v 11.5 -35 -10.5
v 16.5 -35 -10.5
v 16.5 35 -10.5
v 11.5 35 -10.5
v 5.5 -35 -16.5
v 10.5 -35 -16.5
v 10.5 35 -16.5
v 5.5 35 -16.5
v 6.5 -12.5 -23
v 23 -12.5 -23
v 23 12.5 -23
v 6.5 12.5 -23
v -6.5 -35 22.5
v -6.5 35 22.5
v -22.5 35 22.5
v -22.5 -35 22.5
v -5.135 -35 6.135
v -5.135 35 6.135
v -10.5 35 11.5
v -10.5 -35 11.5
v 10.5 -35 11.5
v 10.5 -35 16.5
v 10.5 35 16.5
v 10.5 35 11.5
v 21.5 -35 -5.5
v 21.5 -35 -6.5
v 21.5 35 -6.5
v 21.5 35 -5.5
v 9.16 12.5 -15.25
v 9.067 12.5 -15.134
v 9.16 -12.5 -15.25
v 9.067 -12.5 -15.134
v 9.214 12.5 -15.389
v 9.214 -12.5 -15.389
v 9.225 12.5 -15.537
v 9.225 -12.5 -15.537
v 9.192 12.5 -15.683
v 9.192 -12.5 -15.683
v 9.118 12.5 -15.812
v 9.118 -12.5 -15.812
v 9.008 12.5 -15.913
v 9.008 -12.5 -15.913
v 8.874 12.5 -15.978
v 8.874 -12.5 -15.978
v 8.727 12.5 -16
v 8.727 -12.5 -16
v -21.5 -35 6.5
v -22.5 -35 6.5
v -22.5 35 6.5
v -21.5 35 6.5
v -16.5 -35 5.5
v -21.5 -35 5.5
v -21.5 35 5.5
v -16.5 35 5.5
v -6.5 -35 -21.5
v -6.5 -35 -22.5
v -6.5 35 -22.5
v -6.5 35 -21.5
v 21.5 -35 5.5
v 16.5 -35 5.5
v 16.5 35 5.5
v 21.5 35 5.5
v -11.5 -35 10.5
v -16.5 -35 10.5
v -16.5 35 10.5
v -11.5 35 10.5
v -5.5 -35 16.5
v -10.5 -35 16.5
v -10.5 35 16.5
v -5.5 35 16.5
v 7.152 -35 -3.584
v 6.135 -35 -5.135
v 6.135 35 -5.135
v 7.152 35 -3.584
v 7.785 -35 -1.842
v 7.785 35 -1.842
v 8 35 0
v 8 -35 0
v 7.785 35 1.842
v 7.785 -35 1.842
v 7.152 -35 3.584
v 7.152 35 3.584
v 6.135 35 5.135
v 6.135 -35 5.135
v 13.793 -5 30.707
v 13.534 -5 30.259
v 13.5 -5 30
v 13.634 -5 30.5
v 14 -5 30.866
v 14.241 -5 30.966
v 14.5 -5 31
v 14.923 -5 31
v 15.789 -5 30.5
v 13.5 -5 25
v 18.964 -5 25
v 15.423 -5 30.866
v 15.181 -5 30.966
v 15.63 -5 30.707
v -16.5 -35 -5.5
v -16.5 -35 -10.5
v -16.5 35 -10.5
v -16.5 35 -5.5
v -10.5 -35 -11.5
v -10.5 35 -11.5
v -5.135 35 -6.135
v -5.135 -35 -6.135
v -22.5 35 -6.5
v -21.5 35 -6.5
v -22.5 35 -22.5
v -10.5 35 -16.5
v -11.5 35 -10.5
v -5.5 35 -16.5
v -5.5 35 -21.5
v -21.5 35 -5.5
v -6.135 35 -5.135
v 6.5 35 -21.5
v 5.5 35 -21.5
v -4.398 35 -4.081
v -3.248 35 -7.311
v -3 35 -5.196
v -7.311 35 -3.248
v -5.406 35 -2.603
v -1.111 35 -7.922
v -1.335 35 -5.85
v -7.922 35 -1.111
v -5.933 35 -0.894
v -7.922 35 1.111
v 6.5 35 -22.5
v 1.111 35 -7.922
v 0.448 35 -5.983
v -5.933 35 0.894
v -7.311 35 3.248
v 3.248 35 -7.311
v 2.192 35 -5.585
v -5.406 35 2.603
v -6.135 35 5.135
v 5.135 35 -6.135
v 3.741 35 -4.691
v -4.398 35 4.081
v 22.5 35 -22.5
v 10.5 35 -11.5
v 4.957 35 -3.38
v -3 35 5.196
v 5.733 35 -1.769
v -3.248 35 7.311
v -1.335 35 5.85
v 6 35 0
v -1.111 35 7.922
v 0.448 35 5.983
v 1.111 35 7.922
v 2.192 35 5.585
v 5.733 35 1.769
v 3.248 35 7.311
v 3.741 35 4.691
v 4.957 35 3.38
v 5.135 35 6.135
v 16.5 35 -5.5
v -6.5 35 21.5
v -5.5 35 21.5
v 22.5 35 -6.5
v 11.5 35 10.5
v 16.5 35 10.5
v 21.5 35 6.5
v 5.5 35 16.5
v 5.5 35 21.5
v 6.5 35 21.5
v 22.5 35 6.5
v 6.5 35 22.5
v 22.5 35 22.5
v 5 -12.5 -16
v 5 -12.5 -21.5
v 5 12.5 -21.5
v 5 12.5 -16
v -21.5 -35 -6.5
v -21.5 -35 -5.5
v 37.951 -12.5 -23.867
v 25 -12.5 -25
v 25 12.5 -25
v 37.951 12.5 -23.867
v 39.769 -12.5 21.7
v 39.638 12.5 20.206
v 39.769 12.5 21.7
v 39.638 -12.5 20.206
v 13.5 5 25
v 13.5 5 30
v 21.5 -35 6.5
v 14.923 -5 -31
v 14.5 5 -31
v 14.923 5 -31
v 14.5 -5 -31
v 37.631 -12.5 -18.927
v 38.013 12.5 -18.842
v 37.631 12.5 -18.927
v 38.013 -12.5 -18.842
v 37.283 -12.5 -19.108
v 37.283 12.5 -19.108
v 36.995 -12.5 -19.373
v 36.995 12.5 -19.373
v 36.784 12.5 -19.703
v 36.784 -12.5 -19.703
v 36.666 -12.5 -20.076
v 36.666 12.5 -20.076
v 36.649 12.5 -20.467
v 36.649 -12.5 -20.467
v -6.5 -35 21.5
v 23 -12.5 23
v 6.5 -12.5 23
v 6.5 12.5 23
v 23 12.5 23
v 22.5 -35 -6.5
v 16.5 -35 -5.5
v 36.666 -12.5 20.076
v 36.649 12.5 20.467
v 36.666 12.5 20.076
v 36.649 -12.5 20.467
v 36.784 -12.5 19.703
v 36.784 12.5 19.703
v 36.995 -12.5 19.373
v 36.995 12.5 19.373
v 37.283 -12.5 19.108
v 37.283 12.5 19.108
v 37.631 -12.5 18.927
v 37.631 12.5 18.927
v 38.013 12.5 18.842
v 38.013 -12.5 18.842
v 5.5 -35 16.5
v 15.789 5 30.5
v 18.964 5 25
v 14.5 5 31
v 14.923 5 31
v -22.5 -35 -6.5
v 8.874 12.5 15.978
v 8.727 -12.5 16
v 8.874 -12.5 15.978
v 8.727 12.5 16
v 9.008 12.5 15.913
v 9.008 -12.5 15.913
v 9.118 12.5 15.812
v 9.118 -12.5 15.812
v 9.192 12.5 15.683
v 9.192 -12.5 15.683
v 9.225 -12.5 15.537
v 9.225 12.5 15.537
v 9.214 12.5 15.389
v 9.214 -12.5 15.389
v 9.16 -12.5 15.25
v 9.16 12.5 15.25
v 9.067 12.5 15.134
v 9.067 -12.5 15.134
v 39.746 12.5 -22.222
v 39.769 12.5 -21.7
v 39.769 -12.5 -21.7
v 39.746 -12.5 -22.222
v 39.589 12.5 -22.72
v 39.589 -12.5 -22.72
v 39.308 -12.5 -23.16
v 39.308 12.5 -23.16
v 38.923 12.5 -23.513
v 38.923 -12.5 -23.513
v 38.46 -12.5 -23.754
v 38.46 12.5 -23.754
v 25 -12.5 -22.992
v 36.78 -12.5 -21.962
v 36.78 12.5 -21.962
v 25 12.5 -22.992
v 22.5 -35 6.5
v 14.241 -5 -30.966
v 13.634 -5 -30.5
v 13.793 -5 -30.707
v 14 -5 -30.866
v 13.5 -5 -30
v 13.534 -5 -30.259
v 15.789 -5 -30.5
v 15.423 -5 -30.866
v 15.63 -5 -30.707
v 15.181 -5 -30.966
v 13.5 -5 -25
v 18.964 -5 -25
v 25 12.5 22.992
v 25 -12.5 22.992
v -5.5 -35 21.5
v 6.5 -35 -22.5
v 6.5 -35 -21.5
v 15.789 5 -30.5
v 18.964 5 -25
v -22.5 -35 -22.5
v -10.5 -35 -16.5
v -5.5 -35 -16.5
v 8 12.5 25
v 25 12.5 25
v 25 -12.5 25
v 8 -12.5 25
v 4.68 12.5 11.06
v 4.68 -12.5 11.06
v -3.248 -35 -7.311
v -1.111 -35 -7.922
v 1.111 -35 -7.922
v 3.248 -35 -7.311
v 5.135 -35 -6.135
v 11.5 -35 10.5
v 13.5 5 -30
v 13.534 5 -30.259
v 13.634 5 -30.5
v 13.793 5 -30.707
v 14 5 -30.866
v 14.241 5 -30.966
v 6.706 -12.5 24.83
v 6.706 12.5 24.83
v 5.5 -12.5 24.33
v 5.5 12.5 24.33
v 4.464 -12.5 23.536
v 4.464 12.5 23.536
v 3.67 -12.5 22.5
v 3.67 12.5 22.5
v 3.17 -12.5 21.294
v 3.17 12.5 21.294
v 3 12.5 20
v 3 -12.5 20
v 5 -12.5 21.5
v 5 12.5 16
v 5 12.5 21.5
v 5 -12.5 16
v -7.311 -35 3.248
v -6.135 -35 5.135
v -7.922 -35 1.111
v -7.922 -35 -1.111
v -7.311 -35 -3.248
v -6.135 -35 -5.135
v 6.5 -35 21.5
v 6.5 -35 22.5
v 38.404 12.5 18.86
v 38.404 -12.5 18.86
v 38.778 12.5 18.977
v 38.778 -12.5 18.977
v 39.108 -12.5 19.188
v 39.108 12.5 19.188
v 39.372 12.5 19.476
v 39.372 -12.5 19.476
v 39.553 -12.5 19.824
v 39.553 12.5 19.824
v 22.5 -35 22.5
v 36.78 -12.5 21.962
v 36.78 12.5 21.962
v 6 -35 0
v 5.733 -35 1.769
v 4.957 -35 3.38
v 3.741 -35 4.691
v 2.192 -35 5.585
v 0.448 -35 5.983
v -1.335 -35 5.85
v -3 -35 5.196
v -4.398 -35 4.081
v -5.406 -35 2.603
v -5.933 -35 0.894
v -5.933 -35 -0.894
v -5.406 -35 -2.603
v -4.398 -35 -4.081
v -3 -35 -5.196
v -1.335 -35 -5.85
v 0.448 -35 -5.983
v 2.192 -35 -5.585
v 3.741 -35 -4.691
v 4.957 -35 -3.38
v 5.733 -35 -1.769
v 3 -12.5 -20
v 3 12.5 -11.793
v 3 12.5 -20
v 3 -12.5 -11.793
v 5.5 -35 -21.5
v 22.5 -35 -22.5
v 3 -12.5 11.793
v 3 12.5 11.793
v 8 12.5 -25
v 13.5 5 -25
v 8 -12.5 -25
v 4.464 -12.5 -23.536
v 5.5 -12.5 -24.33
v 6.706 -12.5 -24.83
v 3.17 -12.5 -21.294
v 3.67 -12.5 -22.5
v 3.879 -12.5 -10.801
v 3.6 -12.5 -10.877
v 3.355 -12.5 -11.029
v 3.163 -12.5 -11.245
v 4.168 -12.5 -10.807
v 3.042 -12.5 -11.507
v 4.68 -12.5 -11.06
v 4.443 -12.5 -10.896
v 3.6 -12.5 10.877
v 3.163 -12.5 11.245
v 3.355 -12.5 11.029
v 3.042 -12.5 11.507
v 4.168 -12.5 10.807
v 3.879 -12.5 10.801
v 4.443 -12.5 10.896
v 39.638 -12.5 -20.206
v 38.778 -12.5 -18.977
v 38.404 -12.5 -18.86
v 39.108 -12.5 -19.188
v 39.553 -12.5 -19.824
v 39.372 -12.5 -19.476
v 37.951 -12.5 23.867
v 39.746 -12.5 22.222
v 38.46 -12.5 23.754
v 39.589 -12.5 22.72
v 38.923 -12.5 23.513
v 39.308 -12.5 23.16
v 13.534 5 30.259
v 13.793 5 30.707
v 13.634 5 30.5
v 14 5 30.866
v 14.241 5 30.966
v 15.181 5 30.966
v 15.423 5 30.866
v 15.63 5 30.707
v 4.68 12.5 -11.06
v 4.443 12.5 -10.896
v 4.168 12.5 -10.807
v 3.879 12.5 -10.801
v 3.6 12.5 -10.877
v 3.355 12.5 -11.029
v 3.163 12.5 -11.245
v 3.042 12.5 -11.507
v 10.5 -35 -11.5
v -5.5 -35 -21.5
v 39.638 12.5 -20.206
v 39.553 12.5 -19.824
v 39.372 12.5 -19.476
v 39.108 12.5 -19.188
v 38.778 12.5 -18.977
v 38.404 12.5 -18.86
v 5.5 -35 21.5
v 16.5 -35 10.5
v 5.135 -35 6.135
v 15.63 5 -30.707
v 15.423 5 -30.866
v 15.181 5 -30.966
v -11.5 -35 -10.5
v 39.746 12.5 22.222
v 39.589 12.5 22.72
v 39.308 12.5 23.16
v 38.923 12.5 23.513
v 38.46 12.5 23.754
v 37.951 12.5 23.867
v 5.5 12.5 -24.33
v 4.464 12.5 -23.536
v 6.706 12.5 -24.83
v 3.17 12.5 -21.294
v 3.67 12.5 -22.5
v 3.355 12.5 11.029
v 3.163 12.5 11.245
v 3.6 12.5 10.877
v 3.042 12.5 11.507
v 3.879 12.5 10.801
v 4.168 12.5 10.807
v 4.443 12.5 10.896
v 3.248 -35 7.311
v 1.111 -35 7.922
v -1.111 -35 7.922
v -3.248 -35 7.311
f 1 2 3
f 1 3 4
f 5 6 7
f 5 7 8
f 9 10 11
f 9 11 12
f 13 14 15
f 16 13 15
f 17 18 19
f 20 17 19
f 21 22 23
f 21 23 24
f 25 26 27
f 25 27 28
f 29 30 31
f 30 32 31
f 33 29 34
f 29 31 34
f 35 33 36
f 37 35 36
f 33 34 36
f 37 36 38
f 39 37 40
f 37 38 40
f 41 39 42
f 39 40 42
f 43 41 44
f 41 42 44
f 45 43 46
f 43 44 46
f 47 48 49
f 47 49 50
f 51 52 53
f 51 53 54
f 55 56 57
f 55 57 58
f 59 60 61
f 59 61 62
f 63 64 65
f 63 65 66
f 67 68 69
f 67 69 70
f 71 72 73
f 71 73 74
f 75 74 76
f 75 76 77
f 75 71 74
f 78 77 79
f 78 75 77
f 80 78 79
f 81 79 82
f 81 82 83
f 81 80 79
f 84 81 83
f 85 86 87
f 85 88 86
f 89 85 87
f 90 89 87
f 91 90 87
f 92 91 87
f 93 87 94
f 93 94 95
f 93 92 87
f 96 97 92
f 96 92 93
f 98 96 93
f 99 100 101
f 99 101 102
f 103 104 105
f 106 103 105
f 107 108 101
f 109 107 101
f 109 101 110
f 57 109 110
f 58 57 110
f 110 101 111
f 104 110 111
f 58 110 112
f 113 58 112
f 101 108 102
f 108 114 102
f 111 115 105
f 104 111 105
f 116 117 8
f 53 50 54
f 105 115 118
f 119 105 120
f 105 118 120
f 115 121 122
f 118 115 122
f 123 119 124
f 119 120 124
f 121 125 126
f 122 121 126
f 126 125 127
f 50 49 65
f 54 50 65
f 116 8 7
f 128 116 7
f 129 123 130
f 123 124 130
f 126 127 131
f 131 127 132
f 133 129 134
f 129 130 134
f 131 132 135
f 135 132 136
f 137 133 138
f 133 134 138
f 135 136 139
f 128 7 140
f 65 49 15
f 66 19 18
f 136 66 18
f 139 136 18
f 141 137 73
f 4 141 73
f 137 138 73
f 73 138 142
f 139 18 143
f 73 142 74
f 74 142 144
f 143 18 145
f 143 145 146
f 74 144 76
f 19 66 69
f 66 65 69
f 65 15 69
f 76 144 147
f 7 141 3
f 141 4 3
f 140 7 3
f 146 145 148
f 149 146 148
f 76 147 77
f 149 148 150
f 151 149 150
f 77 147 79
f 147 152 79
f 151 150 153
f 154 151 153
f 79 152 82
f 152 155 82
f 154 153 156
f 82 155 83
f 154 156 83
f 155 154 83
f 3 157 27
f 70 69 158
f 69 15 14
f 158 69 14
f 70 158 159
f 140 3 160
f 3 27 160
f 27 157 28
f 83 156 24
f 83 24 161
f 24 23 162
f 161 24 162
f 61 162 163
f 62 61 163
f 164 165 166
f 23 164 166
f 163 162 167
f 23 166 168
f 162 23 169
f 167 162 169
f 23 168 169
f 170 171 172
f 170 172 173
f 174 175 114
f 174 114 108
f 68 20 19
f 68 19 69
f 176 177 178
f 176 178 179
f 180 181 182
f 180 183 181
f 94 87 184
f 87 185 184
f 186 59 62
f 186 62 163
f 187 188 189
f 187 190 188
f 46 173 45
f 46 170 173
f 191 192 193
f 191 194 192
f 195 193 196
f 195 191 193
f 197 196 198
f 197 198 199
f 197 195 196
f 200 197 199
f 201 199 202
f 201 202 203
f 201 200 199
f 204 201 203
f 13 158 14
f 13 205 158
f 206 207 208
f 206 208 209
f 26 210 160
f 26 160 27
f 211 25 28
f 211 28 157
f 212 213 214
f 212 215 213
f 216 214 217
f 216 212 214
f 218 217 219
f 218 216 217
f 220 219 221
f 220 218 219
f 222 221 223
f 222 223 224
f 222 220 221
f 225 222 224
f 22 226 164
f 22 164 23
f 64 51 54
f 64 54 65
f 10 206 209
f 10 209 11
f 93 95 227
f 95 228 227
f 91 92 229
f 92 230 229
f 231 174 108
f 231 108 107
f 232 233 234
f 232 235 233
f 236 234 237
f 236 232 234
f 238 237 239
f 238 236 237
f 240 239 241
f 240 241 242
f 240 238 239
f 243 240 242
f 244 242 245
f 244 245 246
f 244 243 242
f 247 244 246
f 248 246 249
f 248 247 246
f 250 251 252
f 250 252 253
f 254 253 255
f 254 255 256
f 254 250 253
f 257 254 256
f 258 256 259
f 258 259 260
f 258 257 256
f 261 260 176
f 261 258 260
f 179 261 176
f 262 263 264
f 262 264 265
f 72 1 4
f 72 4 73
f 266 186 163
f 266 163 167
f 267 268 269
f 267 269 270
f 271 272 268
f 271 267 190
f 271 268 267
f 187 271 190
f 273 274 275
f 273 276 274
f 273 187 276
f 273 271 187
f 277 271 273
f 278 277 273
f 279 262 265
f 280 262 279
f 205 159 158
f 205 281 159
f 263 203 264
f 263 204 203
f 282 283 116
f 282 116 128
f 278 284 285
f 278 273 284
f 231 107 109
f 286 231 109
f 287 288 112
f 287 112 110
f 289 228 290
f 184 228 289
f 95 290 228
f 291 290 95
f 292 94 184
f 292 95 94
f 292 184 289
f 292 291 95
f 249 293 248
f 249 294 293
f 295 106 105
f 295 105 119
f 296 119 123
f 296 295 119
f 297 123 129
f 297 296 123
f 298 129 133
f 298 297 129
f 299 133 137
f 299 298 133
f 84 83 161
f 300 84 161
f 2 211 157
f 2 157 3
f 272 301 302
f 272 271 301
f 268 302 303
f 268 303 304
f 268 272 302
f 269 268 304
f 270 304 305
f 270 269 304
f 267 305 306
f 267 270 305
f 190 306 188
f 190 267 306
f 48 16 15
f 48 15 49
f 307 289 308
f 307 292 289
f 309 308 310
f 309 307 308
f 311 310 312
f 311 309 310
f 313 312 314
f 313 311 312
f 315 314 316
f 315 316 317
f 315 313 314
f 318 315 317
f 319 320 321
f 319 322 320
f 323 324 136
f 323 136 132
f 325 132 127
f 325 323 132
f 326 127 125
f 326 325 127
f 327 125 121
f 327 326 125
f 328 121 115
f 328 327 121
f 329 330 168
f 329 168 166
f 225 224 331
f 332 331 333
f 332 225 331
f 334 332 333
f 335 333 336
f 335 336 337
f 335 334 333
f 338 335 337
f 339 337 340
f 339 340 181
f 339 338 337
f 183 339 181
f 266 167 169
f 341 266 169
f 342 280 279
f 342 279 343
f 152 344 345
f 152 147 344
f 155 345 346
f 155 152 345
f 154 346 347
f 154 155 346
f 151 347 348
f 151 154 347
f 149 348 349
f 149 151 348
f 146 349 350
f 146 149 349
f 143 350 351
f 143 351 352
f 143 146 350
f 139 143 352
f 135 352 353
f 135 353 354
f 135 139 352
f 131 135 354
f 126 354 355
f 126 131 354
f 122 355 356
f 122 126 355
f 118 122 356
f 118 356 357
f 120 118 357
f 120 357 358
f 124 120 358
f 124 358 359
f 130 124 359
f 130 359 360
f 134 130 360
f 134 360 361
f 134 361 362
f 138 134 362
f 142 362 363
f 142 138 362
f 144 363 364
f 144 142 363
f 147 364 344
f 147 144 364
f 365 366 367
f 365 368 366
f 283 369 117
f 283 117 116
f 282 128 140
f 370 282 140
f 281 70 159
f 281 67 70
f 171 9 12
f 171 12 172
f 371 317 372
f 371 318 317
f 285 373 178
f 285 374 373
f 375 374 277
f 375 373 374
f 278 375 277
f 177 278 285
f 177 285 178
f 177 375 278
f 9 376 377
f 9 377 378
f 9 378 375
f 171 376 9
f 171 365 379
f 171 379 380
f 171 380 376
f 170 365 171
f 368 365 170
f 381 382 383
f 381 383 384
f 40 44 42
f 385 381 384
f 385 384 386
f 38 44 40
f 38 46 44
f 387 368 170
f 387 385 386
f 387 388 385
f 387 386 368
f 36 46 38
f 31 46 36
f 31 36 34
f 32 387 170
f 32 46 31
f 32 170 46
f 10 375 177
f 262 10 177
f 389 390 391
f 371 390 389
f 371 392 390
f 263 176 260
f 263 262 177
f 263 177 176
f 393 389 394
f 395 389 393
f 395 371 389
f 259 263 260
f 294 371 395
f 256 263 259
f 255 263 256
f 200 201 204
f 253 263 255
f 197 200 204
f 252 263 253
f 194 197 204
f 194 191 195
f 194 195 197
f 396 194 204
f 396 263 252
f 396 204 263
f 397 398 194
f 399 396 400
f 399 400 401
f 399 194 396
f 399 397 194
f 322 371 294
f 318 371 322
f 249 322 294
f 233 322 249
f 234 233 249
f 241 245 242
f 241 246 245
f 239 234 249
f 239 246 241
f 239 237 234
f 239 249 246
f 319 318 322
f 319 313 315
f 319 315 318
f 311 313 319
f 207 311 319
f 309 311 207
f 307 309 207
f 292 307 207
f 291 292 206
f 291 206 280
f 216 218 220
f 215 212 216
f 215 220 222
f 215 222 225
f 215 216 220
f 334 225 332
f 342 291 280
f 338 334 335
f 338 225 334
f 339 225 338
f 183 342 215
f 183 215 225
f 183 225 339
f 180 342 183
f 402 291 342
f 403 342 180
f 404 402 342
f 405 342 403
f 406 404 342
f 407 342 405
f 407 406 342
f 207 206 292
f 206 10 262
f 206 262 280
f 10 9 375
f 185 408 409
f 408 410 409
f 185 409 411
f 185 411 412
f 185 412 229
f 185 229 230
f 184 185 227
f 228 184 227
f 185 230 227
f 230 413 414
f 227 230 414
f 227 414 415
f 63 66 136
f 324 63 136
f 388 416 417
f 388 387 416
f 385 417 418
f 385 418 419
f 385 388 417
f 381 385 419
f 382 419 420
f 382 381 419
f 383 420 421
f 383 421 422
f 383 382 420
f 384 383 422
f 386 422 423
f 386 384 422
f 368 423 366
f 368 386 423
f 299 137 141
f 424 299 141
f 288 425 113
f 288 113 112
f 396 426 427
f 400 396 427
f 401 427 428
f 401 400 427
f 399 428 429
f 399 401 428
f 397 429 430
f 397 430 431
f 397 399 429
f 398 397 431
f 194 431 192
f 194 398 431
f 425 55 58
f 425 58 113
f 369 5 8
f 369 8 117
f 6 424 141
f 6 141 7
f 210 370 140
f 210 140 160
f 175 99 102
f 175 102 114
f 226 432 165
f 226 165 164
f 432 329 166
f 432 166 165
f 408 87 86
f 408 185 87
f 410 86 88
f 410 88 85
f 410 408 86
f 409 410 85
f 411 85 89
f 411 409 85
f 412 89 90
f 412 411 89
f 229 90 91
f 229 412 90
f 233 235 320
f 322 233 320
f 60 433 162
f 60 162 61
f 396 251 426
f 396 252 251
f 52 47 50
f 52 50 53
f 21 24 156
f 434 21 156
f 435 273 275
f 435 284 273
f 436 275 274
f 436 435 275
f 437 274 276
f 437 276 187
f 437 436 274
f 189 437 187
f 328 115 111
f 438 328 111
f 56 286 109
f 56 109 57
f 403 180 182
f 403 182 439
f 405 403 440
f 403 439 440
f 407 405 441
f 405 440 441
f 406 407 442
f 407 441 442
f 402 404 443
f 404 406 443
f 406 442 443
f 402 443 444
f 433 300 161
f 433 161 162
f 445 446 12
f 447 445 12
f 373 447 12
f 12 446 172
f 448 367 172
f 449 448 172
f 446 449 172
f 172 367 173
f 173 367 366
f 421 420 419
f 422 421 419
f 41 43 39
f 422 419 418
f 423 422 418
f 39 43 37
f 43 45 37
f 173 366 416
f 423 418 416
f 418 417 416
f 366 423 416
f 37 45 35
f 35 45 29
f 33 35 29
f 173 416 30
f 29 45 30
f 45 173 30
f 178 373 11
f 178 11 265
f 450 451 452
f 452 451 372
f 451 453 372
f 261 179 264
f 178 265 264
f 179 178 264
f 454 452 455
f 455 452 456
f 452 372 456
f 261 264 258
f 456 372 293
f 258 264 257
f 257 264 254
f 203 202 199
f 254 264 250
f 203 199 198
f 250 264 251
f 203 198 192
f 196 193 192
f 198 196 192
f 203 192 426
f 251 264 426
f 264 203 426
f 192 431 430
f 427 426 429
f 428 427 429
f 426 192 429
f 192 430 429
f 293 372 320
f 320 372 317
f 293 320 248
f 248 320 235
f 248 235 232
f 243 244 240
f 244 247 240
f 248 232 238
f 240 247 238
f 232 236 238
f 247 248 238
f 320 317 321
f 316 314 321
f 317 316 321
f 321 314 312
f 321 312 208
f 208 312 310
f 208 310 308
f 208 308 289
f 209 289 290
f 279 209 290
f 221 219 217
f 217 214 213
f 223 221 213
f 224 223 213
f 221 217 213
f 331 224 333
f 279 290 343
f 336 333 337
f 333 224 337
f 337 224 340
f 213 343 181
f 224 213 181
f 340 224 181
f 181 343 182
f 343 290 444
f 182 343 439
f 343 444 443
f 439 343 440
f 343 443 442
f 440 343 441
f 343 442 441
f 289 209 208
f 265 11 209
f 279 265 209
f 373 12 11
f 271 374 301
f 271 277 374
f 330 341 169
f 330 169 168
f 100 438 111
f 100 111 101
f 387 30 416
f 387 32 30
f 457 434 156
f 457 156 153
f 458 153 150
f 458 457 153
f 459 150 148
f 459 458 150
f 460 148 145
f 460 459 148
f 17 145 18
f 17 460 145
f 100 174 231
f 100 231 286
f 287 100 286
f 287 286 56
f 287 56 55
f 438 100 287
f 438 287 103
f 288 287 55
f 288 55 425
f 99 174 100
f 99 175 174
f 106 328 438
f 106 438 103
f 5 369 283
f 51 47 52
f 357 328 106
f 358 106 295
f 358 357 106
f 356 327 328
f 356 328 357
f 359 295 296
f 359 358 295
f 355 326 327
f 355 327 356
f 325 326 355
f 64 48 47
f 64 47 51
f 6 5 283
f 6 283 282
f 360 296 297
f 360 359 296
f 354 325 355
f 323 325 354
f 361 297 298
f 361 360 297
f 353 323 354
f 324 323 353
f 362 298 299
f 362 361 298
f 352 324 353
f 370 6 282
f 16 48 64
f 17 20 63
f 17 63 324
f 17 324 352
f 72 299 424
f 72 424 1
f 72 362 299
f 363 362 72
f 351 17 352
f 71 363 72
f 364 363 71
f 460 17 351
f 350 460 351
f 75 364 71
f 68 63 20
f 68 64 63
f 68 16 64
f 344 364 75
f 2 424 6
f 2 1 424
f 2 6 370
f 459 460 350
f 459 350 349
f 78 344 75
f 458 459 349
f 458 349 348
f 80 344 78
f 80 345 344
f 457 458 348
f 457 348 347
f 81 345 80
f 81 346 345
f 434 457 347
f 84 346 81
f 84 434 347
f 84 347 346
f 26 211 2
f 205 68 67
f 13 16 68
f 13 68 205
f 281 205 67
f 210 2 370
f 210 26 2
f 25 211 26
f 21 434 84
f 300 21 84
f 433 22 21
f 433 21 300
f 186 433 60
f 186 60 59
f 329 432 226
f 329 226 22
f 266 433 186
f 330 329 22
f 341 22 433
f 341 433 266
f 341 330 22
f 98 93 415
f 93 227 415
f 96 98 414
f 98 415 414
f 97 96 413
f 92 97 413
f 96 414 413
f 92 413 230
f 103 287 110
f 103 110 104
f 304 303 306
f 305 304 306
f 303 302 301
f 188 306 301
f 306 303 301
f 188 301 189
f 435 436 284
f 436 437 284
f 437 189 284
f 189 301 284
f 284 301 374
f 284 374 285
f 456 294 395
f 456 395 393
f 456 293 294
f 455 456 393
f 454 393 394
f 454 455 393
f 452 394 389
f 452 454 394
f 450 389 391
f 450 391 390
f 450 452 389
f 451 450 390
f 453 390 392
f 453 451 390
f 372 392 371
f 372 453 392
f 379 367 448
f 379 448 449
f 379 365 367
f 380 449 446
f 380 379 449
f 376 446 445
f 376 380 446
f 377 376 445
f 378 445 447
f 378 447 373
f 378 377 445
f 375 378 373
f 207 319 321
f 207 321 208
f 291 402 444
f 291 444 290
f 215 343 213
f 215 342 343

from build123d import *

# Parameters (mm, degrees)
F0_R         = 6
F1_DEPTH     = 35
F3_DEPTH     = 12.5
F4_DEPTH     = 5
F5_R         = 5
F6_R         = 0.5
F7_R         = 1
F8_R         = 1
F9_R         = 1.49999
F10_T1_DEPTH = 35


# Not quite as in the source:
# - a fillet or chamfer that OpenCascade refuses, or shapes differently, is made with other operations: its cross-section is extruded or revolved along the edge and cut away or added
# - a fillet or chamfer is up to 0.001 mm smaller than in the source, because OpenCascade refuses the exact size


with BuildPart() as f1:
    # F0 (on Front) → F1 (new body, symmetric)
    with BuildSketch(Plane.XZ):
        with BuildLine():
            Line((-6.5, 21.5), (-6.5, 22.5))
            Line((-6.5, 22.5), (-22.5, 22.5))
            Line((-22.5, 22.5), (-22.5, 6.5))
            Line((-22.5, 6.5), (-21.5, 6.5))
            Line((-21.5, 6.5), (-21.5, 5.5))
            Line((-21.5, 5.5), (-16.5, 5.5))
            Line((-16.5, 5.5), (-16.5, 10.5))
            Line((-16.5, 10.5), (-11.5, 10.5))
            Line((-11.5, 10.5), (-6.1347138348, 5.1347138348))
            ThreePointArc((-6.1347138348, 5.1347138348), (-5.6568542495, 5.6568542495), (-5.1347138348, 6.1347138348))
            Line((-5.1347138348, 6.1347138348), (-10.5, 11.5))
            Line((-10.5, 11.5), (-10.5, 16.5))
            Line((-10.5, 16.5), (-5.5, 16.5))
            Line((-5.5, 16.5), (-5.5, 21.5))
            Line((-5.5, 21.5), (-6.5, 21.5))
        make_face()
        with BuildLine():
            ThreePointArc((5.1347138348, 6.1347138348), (0, 8), (-5.1347138348, 6.1347138348))
            ThreePointArc((-5.1347138348, 6.1347138348), (-5.6568542495, 5.6568542495), (-6.1347138348, 5.1347138348))
            ThreePointArc((-6.1347138348, 5.1347138348), (-8, 0), (-6.1347138348, -5.1347138348))
            ThreePointArc((-6.1347138348, -5.1347138348), (-5.6568542495, -5.6568542495), (-5.1347138348, -6.1347138348))
            ThreePointArc((-5.1347138348, -6.1347138348), (0, -8), (5.1347138348, -6.1347138348))
            ThreePointArc((5.1347138348, -6.1347138348), (5.6568542495, -5.6568542495), (6.1347138348, -5.1347138348))
            ThreePointArc((6.1347138348, -5.1347138348), (7.5192323637, -2.7315095938), (8, 0))
            ThreePointArc((8, 0), (7.5192323637, 2.7315095938), (6.1347138348, 5.1347138348))
            ThreePointArc((6.1347138348, 5.1347138348), (5.6568542495, 5.6568542495), (5.1347138348, 6.1347138348))
        make_face()
        Circle(F0_R, mode=Mode.SUBTRACT)
        with BuildLine():
            Line((10.5, 11.5), (5.1347138348, 6.1347138348))
            ThreePointArc((5.1347138348, 6.1347138348), (5.6568542495, 5.6568542495), (6.1347138348, 5.1347138348))
            Line((6.1347138348, 5.1347138348), (11.5, 10.5))
            Line((11.5, 10.5), (16.5, 10.5))
            Line((16.5, 10.5), (16.5, 5.5))
            Line((16.5, 5.5), (21.5, 5.5))
            Line((21.5, 5.5), (21.5, 6.5))
            Line((21.5, 6.5), (22.5, 6.5))
            Line((22.5, 6.5), (22.5, 22.5))
            Line((22.5, 22.5), (6.5, 22.5))
            Line((6.5, 22.5), (6.5, 21.5))
            Line((6.5, 21.5), (5.5, 21.5))
            Line((5.5, 21.5), (5.5, 16.5))
            Line((5.5, 16.5), (10.5, 16.5))
            Line((10.5, 16.5), (10.5, 11.5))
        make_face()
        with BuildLine():
            ThreePointArc((-5.1347138348, -6.1347138348), (-5.6568542495, -5.6568542495), (-6.1347138348, -5.1347138348))
            Line((-6.1347138348, -5.1347138348), (-11.5, -10.5))
            Line((-11.5, -10.5), (-16.5, -10.5))
            Line((-16.5, -10.5), (-16.5, -5.5))
            Line((-16.5, -5.5), (-21.5, -5.5))
            Line((-21.5, -5.5), (-21.5, -6.5))
            Line((-21.5, -6.5), (-22.5, -6.5))
            Line((-22.5, -6.5), (-22.5, -22.5))
            Line((-22.5, -22.5), (-6.5, -22.5))
            Line((-6.5, -22.5), (-6.5, -21.5))
            Line((-6.5, -21.5), (-5.5, -21.5))
            Line((-5.5, -21.5), (-5.5, -16.5))
            Line((-5.5, -16.5), (-10.5, -16.5))
            Line((-10.5, -16.5), (-10.5, -11.5))
            Line((-10.5, -11.5), (-5.1347138348, -6.1347138348))
        make_face()
        with BuildLine():
            Line((11.5, -10.5), (6.1347138348, -5.1347138348))
            ThreePointArc((6.1347138348, -5.1347138348), (5.6568542495, -5.6568542495), (5.1347138348, -6.1347138348))
            Line((5.1347138348, -6.1347138348), (10.5, -11.5))
            Line((10.5, -11.5), (10.5, -16.5))
            Line((10.5, -16.5), (5.5, -16.5))
            Line((5.5, -16.5), (5.5, -21.5))
            Line((5.5, -21.5), (6.5, -21.5))
            Line((6.5, -21.5), (6.5, -22.5))
            Line((6.5, -22.5), (22.5, -22.5))
            Line((22.5, -22.5), (22.5, -6.5))
            Line((22.5, -6.5), (21.5, -6.5))
            Line((21.5, -6.5), (21.5, -5.5))
            Line((21.5, -5.5), (16.5, -5.5))
            Line((16.5, -5.5), (16.5, -10.5))
            Line((16.5, -10.5), (11.5, -10.5))
        make_face()
    extrude(amount=F1_DEPTH, both=True)


with BuildPart() as f3:
    # F2 (on Front) → F3 (new body, symmetric)
    with BuildSketch(Plane.XZ):
        Polygon((5, 16), (5, 21.5), (6.5, 23), (23, 23), (23, 0), (23, -23), (6.5, -23), (5, -21.5), (5, -16), (10, -16), (3, -9.5), (3, -21.5), (3, -25), (6.5, -25), (13.5, -25), (18.9641016151, -25), (22.5, -25), (25, -25), (25, -22.9923603249), (25, -22.5), (25, 0), (25, 22.5), (25, 22.9923603249), (25, 25), (22.5, 25), (18.9641016151, 25), (15.5, 25), (14.5, 25), (13.5, 25), (6.5, 25), (3, 25), (3, 21.5), (3, 9.5), (10, 16), align=None)
        Polygon((39.9429204714, 23.6926638588), (25, 25), (25, 22.9923603249), (36.7800248916, 21.9617416908), (39.7686089859, 21.7002744626), align=None)
        Polygon((39.7686089859, 21.7002744626), (36.7800248916, 21.9617416908), (36.5185576634, 18.9731575966), (39.5071417576, 18.7116903683), align=None)
        Polygon((25, -22.9923603249), (25, -25), (39.9429204714, -23.6926638588), (39.7686089859, -21.7002744626), (36.7800248916, -21.9617416908), align=None)
        Polygon((36.5185576634, -18.9731575966), (36.7800248916, -21.9617416908), (39.7686089859, -21.7002744626), (39.5071417576, -18.7116903683), align=None)
    extrude(amount=F3_DEPTH, both=True)

    # F2 (on Front) → F4 (join, symmetric)
    with BuildSketch(Plane.XZ):
        Polygon((13.5, 31), (13.5, 25), (14.5, 25), (15.5, 25), (18.9641016151, 25), (15.5, 31), align=None)
        Polygon((18.9641016151, -25), (13.5, -25), (13.5, -31), (15.5, -31), align=None)
    extrude(amount=F4_DEPTH, both=True)

    # F5
    f5_edges = [f3.edges().sort_by_distance(p)[0] for p in [
        (3, 0, 25),
        (3, 0, -25),
    ]]
    fillet(f5_edges, radius=F5_R)

    # F6
    f6_edges = [f3.edges().sort_by_distance(p)[0] for p in [
        (10, 0, 16),
        (10, 0, -16),
    ]]
    fillet(f6_edges, radius=F6_R)

    # F7
    f7_edges = [f3.edges().sort_by_distance(p)[0] for p in [
        (3, 0, 9.5),
        (3, 0, -9.5),
    ]]
    fillet(f7_edges, radius=F7_R)

    # F8
    f8_edges = [f3.edges().sort_by_distance(p)[0] for p in [
        (13.5, 0, 31),
        (15.5, 0, 31),
        (15.5, 0, -31),
        (13.5, 0, -31),
    ]]
    fillet(f8_edges, radius=F8_R)

    # F9 (radius 1.5 in the source; OpenCascade refuses exactly that, so slightly less here)
    f9_edges = [f3.edges().sort_by_distance(p)[0] for p in [
        (39.507142, 0, 18.71169),
        (36.518558, 0, 18.973158),
        (39.507142, 0, -18.71169),
        (36.518558, 0, -18.973158),
    ]]
    fillet(f9_edges, radius=F9_R)

    # F10: fillet of radius 2 on 2 edges, made by hand

    # F10_s2 → F10_t1 (cut)
    with BuildSketch(Plane.XZ.offset(-17.5)):
        with BuildLine():
            ThreePointArc((39.7686089859, 21.7002744626), (39.3083084759, 23.1601611675), (37.9505310752, 23.8669753443))
            Line((37.9505310752, 23.8669753443), (39.9429204714, 23.6926638588))
            Line((39.9429204714, 23.6926638588), (39.7686089859, 21.7002744626))
        make_face()
        with BuildLine():
            ThreePointArc((39.7686089859, -21.7002744626), (39.3083084759, -23.1601611675), (37.9505310752, -23.8669753443))
            Line((37.9505310752, -23.8669753443), (39.9429204714, -23.6926638588))
            Line((39.9429204714, -23.6926638588), (39.7686089859, -21.7002744626))
        make_face()
    extrude(amount=F10_T1_DEPTH, mode=Mode.SUBTRACT)


solid = Compound([f1.part, f3.part])
